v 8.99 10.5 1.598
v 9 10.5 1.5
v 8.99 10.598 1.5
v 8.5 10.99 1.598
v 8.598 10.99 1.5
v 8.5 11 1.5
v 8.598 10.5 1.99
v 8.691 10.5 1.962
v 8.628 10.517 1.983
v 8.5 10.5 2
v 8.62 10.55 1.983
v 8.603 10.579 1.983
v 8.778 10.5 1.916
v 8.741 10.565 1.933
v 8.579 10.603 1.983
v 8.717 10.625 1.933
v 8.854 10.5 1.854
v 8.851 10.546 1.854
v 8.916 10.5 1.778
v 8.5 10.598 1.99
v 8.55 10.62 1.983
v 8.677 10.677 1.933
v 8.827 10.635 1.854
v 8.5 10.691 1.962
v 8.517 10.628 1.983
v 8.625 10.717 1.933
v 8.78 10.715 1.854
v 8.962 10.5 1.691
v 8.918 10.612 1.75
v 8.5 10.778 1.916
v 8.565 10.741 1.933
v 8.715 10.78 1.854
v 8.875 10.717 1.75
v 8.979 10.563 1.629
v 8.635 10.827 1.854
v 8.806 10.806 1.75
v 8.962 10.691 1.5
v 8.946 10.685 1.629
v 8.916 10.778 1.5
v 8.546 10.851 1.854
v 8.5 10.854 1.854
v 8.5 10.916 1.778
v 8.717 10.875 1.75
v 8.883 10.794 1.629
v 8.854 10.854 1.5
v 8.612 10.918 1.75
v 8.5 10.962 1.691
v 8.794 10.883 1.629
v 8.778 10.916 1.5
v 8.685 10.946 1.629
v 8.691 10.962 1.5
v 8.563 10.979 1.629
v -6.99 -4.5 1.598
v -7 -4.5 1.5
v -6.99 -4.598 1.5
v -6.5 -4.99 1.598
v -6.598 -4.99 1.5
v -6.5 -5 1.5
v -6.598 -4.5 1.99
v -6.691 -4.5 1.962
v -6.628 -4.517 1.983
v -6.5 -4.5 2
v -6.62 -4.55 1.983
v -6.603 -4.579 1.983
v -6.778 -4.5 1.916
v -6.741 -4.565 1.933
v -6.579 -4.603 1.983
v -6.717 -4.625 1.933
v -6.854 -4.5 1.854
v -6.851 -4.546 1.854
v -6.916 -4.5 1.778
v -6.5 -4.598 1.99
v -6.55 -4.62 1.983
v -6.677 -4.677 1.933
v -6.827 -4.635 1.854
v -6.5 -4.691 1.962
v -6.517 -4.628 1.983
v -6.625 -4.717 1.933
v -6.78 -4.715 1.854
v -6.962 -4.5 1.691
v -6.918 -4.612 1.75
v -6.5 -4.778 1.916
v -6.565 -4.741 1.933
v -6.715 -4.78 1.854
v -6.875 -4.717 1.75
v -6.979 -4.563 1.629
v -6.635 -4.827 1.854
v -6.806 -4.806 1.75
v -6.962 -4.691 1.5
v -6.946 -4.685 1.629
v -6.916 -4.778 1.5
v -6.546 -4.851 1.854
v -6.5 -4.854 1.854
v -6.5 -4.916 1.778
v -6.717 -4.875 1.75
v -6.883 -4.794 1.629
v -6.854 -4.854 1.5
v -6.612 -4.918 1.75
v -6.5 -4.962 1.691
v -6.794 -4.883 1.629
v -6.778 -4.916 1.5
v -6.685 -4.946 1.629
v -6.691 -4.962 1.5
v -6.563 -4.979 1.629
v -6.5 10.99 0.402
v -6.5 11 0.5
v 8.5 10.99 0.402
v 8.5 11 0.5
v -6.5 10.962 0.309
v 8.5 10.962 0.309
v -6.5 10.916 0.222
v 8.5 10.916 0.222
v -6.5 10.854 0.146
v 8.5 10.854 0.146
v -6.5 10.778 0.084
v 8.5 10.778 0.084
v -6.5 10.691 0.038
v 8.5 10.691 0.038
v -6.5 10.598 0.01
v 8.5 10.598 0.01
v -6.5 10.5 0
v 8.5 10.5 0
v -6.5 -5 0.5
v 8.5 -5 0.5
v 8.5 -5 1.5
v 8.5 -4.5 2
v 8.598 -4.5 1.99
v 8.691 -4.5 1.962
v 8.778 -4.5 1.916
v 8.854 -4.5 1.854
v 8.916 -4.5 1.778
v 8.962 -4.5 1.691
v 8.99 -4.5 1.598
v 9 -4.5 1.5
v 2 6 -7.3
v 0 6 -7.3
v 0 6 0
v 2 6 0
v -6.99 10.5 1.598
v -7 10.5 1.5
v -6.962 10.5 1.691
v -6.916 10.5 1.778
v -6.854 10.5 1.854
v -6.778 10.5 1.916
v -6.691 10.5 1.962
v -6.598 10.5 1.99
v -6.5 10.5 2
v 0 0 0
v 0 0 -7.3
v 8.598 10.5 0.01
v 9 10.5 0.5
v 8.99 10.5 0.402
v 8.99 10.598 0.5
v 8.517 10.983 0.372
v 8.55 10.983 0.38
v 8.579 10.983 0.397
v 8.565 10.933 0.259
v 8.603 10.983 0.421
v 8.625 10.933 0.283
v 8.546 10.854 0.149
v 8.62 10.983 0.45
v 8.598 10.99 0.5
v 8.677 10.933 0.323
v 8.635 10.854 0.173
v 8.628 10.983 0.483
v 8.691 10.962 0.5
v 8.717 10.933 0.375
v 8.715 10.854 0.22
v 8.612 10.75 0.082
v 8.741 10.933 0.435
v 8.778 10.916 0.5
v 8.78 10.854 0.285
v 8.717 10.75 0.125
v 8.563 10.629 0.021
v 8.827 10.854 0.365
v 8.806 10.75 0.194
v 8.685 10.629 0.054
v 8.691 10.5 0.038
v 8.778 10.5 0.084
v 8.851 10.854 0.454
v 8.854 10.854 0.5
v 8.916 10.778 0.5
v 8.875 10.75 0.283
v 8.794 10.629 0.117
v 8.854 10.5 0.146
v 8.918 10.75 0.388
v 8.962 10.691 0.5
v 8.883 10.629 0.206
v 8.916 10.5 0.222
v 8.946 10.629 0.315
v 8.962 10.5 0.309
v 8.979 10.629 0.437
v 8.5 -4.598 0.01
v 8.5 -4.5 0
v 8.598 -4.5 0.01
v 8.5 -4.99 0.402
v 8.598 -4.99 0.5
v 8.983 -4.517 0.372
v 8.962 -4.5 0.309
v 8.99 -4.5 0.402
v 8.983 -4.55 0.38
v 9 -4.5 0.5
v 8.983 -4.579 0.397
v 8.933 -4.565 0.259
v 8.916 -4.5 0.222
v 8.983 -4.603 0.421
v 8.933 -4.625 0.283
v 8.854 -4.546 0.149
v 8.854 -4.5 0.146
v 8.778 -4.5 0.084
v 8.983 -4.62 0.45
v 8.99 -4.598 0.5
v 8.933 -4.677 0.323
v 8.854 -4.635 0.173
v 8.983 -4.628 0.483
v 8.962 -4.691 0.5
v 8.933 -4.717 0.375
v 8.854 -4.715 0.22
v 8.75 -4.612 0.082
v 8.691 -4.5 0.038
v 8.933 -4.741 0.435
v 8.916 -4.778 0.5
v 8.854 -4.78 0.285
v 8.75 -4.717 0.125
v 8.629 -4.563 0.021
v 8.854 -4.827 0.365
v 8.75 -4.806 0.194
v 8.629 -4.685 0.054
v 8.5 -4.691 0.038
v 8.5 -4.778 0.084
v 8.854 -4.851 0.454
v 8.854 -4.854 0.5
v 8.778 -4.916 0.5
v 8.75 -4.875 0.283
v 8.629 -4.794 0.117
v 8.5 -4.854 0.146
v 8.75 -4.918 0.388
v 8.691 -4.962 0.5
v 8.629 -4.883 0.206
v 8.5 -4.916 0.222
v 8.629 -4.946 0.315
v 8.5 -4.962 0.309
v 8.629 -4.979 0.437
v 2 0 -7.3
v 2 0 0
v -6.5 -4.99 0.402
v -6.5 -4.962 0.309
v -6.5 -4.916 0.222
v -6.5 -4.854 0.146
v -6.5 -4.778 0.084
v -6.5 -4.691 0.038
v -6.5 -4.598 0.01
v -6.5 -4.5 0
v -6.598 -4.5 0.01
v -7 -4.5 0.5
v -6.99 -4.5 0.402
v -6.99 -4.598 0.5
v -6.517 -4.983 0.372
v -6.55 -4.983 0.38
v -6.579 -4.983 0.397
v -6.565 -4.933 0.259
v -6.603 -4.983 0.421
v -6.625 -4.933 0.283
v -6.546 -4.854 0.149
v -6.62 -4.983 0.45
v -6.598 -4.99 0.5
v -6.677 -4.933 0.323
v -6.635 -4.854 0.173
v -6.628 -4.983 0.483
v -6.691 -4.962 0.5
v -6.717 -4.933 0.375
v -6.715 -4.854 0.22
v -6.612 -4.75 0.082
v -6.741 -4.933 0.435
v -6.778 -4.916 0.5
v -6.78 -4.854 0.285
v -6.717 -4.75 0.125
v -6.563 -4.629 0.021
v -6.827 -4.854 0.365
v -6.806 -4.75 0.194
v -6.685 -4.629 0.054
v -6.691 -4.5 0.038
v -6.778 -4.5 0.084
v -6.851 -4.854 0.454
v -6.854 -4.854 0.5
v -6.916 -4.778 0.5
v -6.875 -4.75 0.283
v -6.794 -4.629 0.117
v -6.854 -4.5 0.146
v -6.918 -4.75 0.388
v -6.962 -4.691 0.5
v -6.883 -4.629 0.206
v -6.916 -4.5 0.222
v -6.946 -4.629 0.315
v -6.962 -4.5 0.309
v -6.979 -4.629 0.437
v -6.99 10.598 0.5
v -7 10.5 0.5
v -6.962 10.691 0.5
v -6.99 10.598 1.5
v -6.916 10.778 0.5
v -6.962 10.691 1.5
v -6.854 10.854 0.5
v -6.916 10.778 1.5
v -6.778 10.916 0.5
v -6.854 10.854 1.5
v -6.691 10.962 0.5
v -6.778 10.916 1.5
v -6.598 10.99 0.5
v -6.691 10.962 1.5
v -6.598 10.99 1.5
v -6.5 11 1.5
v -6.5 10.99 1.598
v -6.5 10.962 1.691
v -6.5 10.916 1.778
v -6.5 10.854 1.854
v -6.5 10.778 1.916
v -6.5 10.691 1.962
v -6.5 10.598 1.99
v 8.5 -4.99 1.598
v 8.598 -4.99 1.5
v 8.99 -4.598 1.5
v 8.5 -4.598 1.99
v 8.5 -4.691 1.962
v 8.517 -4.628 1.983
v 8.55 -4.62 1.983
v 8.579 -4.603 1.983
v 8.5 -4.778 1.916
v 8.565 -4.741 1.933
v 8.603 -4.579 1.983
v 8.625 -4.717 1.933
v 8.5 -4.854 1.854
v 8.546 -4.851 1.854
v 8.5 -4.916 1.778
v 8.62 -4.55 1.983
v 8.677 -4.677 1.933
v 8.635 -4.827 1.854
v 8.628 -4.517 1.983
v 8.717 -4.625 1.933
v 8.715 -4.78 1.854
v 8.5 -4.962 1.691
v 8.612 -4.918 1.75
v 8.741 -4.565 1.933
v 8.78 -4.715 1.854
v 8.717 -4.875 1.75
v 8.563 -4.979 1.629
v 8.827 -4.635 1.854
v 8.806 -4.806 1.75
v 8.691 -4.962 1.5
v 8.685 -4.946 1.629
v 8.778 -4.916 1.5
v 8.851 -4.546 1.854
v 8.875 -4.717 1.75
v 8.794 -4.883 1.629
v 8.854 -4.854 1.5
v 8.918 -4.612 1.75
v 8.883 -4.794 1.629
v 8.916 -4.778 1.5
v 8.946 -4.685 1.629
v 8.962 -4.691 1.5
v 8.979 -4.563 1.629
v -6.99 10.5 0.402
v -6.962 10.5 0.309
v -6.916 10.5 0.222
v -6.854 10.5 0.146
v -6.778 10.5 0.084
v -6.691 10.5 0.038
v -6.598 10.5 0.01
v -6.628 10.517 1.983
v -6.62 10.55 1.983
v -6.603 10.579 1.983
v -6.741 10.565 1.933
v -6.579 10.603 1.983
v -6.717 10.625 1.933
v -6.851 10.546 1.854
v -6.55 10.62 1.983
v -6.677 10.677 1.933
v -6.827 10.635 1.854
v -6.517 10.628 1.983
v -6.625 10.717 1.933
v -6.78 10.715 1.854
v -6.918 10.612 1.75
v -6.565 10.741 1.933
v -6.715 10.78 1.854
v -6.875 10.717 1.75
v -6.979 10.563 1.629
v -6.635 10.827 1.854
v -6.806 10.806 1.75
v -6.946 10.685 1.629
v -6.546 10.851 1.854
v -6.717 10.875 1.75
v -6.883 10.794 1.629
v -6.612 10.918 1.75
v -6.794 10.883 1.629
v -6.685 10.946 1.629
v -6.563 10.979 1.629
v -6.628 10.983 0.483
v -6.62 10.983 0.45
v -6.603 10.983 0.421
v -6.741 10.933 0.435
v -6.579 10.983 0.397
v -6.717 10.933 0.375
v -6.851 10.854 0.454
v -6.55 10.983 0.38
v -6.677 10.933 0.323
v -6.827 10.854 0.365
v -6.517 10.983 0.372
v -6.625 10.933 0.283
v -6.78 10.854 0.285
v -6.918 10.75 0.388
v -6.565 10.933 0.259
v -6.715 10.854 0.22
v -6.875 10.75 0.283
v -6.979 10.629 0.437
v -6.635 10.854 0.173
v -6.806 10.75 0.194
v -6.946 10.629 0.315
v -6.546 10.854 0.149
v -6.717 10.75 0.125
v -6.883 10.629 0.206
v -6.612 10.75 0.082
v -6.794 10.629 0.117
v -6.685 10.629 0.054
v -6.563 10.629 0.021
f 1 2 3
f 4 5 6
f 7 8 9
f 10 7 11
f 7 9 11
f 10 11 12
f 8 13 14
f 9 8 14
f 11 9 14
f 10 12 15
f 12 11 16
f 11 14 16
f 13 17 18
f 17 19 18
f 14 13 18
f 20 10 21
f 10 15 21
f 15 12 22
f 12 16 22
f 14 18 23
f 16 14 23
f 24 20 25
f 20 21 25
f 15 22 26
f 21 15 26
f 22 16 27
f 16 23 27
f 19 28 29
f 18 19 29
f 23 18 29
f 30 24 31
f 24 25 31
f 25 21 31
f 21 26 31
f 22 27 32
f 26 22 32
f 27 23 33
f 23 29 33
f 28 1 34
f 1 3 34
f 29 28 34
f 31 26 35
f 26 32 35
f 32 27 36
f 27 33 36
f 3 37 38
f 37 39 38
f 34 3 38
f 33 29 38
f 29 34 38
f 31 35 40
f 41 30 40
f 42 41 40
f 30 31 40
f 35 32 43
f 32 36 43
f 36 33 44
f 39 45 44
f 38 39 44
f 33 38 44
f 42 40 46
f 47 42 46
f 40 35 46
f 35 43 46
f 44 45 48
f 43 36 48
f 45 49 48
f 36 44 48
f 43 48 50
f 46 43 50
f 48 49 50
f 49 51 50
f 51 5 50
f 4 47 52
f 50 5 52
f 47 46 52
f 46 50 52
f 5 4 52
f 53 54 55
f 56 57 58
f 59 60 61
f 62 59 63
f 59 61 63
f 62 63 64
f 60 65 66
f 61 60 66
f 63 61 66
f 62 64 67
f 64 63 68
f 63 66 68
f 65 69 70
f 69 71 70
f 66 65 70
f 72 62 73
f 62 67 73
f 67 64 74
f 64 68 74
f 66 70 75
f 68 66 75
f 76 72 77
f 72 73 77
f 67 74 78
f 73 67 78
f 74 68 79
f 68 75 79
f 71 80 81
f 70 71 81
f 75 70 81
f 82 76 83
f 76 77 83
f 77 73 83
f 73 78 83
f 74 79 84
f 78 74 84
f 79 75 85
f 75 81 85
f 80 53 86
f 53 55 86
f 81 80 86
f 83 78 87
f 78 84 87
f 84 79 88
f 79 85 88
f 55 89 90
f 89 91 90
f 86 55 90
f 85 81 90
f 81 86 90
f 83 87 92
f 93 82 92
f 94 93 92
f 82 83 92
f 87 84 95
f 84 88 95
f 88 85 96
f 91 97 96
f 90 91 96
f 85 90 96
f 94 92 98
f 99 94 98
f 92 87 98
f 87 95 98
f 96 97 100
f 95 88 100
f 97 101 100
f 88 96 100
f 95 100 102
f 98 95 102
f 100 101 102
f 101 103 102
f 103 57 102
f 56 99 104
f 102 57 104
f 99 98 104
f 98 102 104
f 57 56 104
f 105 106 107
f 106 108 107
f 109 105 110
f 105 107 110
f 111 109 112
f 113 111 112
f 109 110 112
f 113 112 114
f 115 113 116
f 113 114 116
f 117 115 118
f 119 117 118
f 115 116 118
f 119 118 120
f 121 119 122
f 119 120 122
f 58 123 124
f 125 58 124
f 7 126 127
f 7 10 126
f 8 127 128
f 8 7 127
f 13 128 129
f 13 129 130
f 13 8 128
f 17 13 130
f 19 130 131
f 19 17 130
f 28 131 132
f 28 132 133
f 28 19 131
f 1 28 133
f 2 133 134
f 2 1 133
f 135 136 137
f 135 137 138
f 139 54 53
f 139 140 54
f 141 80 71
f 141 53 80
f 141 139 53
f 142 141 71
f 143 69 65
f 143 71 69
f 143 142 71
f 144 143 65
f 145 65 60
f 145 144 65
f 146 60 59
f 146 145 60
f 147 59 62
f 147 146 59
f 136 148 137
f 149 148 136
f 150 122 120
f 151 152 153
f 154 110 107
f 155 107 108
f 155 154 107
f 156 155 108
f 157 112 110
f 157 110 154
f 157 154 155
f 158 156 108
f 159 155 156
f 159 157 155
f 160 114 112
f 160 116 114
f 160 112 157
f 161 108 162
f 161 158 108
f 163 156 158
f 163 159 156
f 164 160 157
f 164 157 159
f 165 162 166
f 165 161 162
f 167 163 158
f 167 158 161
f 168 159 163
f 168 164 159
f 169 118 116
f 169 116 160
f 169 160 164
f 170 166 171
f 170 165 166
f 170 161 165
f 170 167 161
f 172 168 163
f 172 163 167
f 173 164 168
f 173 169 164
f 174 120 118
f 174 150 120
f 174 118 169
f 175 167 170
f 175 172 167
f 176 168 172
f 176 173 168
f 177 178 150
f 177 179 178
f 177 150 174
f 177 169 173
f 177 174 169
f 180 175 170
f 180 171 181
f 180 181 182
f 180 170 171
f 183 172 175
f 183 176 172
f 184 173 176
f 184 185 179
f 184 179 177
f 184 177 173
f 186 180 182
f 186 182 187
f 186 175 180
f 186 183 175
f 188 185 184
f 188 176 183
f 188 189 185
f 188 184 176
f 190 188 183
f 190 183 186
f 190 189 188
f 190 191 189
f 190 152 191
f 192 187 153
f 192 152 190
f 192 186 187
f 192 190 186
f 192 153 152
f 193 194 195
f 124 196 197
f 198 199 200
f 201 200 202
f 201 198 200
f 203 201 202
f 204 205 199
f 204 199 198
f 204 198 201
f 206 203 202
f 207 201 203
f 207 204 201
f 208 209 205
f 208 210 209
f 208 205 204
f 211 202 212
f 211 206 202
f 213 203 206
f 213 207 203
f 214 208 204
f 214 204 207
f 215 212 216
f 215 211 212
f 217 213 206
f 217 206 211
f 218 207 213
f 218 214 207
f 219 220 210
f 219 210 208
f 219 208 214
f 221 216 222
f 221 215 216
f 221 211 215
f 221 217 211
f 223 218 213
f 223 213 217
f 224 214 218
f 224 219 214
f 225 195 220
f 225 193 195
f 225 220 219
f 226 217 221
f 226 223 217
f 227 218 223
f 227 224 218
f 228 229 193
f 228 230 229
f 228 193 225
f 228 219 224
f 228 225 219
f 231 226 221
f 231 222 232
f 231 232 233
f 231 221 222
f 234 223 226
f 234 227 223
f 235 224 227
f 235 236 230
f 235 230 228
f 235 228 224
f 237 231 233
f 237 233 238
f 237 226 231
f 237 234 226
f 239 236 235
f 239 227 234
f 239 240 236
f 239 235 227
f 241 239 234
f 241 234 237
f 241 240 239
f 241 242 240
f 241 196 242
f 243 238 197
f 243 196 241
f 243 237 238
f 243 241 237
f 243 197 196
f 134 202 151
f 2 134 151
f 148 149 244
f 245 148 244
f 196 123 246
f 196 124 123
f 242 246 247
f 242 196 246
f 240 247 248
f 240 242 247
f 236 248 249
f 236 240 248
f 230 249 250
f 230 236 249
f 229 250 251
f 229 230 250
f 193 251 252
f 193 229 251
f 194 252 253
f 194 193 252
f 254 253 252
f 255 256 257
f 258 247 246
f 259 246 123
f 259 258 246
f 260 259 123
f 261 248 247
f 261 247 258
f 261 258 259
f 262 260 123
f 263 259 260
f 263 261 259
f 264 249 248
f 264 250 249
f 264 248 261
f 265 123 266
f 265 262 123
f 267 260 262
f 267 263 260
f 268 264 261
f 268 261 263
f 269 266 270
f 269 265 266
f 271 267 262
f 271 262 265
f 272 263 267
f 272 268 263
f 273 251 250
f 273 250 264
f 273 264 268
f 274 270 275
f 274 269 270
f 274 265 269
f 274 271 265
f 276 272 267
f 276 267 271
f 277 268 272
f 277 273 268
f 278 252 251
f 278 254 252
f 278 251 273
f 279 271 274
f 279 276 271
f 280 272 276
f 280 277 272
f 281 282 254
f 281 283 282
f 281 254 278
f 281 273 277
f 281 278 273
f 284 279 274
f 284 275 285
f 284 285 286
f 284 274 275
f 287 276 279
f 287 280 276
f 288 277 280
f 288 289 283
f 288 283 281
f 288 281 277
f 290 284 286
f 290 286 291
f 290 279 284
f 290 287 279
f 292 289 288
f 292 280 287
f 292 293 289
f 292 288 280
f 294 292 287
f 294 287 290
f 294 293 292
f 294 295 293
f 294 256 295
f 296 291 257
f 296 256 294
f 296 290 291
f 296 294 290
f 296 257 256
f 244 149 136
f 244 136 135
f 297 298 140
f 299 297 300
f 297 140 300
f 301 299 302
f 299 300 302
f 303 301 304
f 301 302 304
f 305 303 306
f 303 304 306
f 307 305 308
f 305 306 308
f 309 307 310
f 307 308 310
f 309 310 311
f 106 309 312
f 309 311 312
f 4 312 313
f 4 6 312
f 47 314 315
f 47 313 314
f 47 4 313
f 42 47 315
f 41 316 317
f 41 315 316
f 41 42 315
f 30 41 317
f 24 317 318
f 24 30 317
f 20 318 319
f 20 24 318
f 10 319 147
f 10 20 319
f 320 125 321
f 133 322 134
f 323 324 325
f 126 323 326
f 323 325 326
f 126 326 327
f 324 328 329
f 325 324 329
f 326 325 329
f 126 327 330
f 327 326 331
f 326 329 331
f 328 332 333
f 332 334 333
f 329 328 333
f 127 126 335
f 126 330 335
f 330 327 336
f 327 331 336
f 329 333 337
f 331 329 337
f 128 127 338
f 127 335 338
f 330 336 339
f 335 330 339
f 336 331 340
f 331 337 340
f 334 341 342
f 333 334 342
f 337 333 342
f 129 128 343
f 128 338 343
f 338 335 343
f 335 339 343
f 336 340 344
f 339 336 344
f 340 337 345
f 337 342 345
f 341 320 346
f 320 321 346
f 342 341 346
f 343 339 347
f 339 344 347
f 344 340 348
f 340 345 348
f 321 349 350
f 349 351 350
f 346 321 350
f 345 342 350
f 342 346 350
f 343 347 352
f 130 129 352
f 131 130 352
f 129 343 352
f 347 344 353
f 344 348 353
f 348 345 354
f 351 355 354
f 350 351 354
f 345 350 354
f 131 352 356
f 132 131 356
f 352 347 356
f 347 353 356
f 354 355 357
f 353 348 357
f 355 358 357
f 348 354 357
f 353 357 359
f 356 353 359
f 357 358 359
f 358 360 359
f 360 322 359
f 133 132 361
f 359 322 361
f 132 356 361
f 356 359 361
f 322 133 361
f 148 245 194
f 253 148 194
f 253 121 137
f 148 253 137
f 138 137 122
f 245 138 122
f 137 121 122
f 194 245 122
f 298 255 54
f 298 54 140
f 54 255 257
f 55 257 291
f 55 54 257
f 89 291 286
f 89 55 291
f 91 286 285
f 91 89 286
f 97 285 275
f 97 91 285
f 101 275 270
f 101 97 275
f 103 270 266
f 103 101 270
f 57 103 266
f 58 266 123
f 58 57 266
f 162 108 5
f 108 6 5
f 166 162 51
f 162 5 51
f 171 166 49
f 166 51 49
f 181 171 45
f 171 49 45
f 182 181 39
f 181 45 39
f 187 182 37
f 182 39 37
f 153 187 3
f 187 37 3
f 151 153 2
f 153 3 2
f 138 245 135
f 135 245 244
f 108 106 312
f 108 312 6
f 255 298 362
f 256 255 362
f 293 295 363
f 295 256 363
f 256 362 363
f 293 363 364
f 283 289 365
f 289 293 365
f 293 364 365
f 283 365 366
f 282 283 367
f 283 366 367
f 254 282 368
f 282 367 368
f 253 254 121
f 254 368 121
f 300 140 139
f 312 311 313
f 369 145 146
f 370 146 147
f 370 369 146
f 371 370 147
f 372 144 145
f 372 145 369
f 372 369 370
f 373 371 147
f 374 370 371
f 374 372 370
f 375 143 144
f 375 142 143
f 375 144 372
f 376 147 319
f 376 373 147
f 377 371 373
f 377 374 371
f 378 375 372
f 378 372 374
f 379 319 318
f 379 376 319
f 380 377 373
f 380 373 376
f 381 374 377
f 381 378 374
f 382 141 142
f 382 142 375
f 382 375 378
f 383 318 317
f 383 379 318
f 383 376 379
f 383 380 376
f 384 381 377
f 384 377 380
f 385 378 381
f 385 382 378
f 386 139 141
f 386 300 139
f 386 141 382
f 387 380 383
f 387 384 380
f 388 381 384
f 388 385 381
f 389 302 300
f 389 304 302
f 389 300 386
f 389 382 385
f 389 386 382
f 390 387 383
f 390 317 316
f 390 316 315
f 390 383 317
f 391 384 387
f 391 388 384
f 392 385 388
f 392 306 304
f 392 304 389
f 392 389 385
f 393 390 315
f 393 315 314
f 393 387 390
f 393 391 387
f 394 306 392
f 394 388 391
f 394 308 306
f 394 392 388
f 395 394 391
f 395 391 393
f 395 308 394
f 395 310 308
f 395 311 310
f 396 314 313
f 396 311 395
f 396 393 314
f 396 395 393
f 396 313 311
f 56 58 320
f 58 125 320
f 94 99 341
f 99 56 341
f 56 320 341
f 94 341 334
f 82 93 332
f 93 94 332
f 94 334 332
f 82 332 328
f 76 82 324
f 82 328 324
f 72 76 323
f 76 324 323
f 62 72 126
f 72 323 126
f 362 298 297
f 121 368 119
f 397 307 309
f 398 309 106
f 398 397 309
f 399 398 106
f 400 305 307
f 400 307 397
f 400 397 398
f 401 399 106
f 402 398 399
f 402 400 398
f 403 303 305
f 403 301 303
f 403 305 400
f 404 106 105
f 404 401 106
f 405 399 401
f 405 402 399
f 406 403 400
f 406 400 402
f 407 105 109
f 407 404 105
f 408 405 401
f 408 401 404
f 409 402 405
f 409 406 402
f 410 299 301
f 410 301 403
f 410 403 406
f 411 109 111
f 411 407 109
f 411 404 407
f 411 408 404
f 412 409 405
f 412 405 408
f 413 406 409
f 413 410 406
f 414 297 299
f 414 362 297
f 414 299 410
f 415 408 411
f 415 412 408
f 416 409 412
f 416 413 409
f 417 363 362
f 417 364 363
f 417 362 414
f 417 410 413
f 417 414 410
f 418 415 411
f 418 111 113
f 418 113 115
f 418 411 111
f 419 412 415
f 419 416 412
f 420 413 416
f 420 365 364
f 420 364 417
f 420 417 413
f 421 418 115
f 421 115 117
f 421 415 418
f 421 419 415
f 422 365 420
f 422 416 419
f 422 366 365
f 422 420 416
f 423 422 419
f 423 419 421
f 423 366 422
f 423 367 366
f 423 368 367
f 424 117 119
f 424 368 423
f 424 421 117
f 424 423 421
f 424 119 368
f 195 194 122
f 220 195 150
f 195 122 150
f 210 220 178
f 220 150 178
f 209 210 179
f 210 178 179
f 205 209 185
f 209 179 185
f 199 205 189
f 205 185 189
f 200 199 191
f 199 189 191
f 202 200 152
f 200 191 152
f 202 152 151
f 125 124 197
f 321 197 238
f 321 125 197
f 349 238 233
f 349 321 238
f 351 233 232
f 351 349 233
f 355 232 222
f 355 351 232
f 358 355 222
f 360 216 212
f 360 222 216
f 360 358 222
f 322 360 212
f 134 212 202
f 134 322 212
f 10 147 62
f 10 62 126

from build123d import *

# Parameters (mm, degrees)
SKETCH1_W           = 2
SKETCH1_H           = 7.3
BOSS_EXTRUDE1_DEPTH = 6
SKETCH3_W           = 16
SKETCH3_H           = 16
BOSS_EXTRUDE3_DEPTH = 2
FILLET2_R           = 0.5


with BuildPart() as part:
    # Sketch1 → Boss-Extrude1 (new body)
    with BuildSketch(Plane(origin=(0, 0, 0), x_dir=(1, 0, 0), z_dir=(0, 1, 0))):
        with Locations((1, 3.65)):
            Rectangle(SKETCH1_W, SKETCH1_H)
    extrude(amount=BOSS_EXTRUDE1_DEPTH)

    # Sketch3 → Boss-Extrude3 (add)
    with BuildSketch(Plane.XY):
        with Locations((1, 3)):
            Rectangle(SKETCH3_W, SKETCH3_H)
    extrude(amount=BOSS_EXTRUDE3_DEPTH)

    # Fillet2
    fillet2_edges = [part.edges().sort_by_distance(p)[0] for p in [
        (-7, 3, 0),
        (-7, 11, 1),
        (1, -5, 0),
        (-7, -5, 1),
        (9, 3, 0),
        (9, -5, 1),
        (1, 11, 0),
        (9, 11, 1),
        (-7, 3, 2),
        (1, -5, 2),
        (9, 3, 2),
        (1, 11, 2),
    ]]
    fillet(fillet2_edges, radius=FILLET2_R)


solid = part.part
